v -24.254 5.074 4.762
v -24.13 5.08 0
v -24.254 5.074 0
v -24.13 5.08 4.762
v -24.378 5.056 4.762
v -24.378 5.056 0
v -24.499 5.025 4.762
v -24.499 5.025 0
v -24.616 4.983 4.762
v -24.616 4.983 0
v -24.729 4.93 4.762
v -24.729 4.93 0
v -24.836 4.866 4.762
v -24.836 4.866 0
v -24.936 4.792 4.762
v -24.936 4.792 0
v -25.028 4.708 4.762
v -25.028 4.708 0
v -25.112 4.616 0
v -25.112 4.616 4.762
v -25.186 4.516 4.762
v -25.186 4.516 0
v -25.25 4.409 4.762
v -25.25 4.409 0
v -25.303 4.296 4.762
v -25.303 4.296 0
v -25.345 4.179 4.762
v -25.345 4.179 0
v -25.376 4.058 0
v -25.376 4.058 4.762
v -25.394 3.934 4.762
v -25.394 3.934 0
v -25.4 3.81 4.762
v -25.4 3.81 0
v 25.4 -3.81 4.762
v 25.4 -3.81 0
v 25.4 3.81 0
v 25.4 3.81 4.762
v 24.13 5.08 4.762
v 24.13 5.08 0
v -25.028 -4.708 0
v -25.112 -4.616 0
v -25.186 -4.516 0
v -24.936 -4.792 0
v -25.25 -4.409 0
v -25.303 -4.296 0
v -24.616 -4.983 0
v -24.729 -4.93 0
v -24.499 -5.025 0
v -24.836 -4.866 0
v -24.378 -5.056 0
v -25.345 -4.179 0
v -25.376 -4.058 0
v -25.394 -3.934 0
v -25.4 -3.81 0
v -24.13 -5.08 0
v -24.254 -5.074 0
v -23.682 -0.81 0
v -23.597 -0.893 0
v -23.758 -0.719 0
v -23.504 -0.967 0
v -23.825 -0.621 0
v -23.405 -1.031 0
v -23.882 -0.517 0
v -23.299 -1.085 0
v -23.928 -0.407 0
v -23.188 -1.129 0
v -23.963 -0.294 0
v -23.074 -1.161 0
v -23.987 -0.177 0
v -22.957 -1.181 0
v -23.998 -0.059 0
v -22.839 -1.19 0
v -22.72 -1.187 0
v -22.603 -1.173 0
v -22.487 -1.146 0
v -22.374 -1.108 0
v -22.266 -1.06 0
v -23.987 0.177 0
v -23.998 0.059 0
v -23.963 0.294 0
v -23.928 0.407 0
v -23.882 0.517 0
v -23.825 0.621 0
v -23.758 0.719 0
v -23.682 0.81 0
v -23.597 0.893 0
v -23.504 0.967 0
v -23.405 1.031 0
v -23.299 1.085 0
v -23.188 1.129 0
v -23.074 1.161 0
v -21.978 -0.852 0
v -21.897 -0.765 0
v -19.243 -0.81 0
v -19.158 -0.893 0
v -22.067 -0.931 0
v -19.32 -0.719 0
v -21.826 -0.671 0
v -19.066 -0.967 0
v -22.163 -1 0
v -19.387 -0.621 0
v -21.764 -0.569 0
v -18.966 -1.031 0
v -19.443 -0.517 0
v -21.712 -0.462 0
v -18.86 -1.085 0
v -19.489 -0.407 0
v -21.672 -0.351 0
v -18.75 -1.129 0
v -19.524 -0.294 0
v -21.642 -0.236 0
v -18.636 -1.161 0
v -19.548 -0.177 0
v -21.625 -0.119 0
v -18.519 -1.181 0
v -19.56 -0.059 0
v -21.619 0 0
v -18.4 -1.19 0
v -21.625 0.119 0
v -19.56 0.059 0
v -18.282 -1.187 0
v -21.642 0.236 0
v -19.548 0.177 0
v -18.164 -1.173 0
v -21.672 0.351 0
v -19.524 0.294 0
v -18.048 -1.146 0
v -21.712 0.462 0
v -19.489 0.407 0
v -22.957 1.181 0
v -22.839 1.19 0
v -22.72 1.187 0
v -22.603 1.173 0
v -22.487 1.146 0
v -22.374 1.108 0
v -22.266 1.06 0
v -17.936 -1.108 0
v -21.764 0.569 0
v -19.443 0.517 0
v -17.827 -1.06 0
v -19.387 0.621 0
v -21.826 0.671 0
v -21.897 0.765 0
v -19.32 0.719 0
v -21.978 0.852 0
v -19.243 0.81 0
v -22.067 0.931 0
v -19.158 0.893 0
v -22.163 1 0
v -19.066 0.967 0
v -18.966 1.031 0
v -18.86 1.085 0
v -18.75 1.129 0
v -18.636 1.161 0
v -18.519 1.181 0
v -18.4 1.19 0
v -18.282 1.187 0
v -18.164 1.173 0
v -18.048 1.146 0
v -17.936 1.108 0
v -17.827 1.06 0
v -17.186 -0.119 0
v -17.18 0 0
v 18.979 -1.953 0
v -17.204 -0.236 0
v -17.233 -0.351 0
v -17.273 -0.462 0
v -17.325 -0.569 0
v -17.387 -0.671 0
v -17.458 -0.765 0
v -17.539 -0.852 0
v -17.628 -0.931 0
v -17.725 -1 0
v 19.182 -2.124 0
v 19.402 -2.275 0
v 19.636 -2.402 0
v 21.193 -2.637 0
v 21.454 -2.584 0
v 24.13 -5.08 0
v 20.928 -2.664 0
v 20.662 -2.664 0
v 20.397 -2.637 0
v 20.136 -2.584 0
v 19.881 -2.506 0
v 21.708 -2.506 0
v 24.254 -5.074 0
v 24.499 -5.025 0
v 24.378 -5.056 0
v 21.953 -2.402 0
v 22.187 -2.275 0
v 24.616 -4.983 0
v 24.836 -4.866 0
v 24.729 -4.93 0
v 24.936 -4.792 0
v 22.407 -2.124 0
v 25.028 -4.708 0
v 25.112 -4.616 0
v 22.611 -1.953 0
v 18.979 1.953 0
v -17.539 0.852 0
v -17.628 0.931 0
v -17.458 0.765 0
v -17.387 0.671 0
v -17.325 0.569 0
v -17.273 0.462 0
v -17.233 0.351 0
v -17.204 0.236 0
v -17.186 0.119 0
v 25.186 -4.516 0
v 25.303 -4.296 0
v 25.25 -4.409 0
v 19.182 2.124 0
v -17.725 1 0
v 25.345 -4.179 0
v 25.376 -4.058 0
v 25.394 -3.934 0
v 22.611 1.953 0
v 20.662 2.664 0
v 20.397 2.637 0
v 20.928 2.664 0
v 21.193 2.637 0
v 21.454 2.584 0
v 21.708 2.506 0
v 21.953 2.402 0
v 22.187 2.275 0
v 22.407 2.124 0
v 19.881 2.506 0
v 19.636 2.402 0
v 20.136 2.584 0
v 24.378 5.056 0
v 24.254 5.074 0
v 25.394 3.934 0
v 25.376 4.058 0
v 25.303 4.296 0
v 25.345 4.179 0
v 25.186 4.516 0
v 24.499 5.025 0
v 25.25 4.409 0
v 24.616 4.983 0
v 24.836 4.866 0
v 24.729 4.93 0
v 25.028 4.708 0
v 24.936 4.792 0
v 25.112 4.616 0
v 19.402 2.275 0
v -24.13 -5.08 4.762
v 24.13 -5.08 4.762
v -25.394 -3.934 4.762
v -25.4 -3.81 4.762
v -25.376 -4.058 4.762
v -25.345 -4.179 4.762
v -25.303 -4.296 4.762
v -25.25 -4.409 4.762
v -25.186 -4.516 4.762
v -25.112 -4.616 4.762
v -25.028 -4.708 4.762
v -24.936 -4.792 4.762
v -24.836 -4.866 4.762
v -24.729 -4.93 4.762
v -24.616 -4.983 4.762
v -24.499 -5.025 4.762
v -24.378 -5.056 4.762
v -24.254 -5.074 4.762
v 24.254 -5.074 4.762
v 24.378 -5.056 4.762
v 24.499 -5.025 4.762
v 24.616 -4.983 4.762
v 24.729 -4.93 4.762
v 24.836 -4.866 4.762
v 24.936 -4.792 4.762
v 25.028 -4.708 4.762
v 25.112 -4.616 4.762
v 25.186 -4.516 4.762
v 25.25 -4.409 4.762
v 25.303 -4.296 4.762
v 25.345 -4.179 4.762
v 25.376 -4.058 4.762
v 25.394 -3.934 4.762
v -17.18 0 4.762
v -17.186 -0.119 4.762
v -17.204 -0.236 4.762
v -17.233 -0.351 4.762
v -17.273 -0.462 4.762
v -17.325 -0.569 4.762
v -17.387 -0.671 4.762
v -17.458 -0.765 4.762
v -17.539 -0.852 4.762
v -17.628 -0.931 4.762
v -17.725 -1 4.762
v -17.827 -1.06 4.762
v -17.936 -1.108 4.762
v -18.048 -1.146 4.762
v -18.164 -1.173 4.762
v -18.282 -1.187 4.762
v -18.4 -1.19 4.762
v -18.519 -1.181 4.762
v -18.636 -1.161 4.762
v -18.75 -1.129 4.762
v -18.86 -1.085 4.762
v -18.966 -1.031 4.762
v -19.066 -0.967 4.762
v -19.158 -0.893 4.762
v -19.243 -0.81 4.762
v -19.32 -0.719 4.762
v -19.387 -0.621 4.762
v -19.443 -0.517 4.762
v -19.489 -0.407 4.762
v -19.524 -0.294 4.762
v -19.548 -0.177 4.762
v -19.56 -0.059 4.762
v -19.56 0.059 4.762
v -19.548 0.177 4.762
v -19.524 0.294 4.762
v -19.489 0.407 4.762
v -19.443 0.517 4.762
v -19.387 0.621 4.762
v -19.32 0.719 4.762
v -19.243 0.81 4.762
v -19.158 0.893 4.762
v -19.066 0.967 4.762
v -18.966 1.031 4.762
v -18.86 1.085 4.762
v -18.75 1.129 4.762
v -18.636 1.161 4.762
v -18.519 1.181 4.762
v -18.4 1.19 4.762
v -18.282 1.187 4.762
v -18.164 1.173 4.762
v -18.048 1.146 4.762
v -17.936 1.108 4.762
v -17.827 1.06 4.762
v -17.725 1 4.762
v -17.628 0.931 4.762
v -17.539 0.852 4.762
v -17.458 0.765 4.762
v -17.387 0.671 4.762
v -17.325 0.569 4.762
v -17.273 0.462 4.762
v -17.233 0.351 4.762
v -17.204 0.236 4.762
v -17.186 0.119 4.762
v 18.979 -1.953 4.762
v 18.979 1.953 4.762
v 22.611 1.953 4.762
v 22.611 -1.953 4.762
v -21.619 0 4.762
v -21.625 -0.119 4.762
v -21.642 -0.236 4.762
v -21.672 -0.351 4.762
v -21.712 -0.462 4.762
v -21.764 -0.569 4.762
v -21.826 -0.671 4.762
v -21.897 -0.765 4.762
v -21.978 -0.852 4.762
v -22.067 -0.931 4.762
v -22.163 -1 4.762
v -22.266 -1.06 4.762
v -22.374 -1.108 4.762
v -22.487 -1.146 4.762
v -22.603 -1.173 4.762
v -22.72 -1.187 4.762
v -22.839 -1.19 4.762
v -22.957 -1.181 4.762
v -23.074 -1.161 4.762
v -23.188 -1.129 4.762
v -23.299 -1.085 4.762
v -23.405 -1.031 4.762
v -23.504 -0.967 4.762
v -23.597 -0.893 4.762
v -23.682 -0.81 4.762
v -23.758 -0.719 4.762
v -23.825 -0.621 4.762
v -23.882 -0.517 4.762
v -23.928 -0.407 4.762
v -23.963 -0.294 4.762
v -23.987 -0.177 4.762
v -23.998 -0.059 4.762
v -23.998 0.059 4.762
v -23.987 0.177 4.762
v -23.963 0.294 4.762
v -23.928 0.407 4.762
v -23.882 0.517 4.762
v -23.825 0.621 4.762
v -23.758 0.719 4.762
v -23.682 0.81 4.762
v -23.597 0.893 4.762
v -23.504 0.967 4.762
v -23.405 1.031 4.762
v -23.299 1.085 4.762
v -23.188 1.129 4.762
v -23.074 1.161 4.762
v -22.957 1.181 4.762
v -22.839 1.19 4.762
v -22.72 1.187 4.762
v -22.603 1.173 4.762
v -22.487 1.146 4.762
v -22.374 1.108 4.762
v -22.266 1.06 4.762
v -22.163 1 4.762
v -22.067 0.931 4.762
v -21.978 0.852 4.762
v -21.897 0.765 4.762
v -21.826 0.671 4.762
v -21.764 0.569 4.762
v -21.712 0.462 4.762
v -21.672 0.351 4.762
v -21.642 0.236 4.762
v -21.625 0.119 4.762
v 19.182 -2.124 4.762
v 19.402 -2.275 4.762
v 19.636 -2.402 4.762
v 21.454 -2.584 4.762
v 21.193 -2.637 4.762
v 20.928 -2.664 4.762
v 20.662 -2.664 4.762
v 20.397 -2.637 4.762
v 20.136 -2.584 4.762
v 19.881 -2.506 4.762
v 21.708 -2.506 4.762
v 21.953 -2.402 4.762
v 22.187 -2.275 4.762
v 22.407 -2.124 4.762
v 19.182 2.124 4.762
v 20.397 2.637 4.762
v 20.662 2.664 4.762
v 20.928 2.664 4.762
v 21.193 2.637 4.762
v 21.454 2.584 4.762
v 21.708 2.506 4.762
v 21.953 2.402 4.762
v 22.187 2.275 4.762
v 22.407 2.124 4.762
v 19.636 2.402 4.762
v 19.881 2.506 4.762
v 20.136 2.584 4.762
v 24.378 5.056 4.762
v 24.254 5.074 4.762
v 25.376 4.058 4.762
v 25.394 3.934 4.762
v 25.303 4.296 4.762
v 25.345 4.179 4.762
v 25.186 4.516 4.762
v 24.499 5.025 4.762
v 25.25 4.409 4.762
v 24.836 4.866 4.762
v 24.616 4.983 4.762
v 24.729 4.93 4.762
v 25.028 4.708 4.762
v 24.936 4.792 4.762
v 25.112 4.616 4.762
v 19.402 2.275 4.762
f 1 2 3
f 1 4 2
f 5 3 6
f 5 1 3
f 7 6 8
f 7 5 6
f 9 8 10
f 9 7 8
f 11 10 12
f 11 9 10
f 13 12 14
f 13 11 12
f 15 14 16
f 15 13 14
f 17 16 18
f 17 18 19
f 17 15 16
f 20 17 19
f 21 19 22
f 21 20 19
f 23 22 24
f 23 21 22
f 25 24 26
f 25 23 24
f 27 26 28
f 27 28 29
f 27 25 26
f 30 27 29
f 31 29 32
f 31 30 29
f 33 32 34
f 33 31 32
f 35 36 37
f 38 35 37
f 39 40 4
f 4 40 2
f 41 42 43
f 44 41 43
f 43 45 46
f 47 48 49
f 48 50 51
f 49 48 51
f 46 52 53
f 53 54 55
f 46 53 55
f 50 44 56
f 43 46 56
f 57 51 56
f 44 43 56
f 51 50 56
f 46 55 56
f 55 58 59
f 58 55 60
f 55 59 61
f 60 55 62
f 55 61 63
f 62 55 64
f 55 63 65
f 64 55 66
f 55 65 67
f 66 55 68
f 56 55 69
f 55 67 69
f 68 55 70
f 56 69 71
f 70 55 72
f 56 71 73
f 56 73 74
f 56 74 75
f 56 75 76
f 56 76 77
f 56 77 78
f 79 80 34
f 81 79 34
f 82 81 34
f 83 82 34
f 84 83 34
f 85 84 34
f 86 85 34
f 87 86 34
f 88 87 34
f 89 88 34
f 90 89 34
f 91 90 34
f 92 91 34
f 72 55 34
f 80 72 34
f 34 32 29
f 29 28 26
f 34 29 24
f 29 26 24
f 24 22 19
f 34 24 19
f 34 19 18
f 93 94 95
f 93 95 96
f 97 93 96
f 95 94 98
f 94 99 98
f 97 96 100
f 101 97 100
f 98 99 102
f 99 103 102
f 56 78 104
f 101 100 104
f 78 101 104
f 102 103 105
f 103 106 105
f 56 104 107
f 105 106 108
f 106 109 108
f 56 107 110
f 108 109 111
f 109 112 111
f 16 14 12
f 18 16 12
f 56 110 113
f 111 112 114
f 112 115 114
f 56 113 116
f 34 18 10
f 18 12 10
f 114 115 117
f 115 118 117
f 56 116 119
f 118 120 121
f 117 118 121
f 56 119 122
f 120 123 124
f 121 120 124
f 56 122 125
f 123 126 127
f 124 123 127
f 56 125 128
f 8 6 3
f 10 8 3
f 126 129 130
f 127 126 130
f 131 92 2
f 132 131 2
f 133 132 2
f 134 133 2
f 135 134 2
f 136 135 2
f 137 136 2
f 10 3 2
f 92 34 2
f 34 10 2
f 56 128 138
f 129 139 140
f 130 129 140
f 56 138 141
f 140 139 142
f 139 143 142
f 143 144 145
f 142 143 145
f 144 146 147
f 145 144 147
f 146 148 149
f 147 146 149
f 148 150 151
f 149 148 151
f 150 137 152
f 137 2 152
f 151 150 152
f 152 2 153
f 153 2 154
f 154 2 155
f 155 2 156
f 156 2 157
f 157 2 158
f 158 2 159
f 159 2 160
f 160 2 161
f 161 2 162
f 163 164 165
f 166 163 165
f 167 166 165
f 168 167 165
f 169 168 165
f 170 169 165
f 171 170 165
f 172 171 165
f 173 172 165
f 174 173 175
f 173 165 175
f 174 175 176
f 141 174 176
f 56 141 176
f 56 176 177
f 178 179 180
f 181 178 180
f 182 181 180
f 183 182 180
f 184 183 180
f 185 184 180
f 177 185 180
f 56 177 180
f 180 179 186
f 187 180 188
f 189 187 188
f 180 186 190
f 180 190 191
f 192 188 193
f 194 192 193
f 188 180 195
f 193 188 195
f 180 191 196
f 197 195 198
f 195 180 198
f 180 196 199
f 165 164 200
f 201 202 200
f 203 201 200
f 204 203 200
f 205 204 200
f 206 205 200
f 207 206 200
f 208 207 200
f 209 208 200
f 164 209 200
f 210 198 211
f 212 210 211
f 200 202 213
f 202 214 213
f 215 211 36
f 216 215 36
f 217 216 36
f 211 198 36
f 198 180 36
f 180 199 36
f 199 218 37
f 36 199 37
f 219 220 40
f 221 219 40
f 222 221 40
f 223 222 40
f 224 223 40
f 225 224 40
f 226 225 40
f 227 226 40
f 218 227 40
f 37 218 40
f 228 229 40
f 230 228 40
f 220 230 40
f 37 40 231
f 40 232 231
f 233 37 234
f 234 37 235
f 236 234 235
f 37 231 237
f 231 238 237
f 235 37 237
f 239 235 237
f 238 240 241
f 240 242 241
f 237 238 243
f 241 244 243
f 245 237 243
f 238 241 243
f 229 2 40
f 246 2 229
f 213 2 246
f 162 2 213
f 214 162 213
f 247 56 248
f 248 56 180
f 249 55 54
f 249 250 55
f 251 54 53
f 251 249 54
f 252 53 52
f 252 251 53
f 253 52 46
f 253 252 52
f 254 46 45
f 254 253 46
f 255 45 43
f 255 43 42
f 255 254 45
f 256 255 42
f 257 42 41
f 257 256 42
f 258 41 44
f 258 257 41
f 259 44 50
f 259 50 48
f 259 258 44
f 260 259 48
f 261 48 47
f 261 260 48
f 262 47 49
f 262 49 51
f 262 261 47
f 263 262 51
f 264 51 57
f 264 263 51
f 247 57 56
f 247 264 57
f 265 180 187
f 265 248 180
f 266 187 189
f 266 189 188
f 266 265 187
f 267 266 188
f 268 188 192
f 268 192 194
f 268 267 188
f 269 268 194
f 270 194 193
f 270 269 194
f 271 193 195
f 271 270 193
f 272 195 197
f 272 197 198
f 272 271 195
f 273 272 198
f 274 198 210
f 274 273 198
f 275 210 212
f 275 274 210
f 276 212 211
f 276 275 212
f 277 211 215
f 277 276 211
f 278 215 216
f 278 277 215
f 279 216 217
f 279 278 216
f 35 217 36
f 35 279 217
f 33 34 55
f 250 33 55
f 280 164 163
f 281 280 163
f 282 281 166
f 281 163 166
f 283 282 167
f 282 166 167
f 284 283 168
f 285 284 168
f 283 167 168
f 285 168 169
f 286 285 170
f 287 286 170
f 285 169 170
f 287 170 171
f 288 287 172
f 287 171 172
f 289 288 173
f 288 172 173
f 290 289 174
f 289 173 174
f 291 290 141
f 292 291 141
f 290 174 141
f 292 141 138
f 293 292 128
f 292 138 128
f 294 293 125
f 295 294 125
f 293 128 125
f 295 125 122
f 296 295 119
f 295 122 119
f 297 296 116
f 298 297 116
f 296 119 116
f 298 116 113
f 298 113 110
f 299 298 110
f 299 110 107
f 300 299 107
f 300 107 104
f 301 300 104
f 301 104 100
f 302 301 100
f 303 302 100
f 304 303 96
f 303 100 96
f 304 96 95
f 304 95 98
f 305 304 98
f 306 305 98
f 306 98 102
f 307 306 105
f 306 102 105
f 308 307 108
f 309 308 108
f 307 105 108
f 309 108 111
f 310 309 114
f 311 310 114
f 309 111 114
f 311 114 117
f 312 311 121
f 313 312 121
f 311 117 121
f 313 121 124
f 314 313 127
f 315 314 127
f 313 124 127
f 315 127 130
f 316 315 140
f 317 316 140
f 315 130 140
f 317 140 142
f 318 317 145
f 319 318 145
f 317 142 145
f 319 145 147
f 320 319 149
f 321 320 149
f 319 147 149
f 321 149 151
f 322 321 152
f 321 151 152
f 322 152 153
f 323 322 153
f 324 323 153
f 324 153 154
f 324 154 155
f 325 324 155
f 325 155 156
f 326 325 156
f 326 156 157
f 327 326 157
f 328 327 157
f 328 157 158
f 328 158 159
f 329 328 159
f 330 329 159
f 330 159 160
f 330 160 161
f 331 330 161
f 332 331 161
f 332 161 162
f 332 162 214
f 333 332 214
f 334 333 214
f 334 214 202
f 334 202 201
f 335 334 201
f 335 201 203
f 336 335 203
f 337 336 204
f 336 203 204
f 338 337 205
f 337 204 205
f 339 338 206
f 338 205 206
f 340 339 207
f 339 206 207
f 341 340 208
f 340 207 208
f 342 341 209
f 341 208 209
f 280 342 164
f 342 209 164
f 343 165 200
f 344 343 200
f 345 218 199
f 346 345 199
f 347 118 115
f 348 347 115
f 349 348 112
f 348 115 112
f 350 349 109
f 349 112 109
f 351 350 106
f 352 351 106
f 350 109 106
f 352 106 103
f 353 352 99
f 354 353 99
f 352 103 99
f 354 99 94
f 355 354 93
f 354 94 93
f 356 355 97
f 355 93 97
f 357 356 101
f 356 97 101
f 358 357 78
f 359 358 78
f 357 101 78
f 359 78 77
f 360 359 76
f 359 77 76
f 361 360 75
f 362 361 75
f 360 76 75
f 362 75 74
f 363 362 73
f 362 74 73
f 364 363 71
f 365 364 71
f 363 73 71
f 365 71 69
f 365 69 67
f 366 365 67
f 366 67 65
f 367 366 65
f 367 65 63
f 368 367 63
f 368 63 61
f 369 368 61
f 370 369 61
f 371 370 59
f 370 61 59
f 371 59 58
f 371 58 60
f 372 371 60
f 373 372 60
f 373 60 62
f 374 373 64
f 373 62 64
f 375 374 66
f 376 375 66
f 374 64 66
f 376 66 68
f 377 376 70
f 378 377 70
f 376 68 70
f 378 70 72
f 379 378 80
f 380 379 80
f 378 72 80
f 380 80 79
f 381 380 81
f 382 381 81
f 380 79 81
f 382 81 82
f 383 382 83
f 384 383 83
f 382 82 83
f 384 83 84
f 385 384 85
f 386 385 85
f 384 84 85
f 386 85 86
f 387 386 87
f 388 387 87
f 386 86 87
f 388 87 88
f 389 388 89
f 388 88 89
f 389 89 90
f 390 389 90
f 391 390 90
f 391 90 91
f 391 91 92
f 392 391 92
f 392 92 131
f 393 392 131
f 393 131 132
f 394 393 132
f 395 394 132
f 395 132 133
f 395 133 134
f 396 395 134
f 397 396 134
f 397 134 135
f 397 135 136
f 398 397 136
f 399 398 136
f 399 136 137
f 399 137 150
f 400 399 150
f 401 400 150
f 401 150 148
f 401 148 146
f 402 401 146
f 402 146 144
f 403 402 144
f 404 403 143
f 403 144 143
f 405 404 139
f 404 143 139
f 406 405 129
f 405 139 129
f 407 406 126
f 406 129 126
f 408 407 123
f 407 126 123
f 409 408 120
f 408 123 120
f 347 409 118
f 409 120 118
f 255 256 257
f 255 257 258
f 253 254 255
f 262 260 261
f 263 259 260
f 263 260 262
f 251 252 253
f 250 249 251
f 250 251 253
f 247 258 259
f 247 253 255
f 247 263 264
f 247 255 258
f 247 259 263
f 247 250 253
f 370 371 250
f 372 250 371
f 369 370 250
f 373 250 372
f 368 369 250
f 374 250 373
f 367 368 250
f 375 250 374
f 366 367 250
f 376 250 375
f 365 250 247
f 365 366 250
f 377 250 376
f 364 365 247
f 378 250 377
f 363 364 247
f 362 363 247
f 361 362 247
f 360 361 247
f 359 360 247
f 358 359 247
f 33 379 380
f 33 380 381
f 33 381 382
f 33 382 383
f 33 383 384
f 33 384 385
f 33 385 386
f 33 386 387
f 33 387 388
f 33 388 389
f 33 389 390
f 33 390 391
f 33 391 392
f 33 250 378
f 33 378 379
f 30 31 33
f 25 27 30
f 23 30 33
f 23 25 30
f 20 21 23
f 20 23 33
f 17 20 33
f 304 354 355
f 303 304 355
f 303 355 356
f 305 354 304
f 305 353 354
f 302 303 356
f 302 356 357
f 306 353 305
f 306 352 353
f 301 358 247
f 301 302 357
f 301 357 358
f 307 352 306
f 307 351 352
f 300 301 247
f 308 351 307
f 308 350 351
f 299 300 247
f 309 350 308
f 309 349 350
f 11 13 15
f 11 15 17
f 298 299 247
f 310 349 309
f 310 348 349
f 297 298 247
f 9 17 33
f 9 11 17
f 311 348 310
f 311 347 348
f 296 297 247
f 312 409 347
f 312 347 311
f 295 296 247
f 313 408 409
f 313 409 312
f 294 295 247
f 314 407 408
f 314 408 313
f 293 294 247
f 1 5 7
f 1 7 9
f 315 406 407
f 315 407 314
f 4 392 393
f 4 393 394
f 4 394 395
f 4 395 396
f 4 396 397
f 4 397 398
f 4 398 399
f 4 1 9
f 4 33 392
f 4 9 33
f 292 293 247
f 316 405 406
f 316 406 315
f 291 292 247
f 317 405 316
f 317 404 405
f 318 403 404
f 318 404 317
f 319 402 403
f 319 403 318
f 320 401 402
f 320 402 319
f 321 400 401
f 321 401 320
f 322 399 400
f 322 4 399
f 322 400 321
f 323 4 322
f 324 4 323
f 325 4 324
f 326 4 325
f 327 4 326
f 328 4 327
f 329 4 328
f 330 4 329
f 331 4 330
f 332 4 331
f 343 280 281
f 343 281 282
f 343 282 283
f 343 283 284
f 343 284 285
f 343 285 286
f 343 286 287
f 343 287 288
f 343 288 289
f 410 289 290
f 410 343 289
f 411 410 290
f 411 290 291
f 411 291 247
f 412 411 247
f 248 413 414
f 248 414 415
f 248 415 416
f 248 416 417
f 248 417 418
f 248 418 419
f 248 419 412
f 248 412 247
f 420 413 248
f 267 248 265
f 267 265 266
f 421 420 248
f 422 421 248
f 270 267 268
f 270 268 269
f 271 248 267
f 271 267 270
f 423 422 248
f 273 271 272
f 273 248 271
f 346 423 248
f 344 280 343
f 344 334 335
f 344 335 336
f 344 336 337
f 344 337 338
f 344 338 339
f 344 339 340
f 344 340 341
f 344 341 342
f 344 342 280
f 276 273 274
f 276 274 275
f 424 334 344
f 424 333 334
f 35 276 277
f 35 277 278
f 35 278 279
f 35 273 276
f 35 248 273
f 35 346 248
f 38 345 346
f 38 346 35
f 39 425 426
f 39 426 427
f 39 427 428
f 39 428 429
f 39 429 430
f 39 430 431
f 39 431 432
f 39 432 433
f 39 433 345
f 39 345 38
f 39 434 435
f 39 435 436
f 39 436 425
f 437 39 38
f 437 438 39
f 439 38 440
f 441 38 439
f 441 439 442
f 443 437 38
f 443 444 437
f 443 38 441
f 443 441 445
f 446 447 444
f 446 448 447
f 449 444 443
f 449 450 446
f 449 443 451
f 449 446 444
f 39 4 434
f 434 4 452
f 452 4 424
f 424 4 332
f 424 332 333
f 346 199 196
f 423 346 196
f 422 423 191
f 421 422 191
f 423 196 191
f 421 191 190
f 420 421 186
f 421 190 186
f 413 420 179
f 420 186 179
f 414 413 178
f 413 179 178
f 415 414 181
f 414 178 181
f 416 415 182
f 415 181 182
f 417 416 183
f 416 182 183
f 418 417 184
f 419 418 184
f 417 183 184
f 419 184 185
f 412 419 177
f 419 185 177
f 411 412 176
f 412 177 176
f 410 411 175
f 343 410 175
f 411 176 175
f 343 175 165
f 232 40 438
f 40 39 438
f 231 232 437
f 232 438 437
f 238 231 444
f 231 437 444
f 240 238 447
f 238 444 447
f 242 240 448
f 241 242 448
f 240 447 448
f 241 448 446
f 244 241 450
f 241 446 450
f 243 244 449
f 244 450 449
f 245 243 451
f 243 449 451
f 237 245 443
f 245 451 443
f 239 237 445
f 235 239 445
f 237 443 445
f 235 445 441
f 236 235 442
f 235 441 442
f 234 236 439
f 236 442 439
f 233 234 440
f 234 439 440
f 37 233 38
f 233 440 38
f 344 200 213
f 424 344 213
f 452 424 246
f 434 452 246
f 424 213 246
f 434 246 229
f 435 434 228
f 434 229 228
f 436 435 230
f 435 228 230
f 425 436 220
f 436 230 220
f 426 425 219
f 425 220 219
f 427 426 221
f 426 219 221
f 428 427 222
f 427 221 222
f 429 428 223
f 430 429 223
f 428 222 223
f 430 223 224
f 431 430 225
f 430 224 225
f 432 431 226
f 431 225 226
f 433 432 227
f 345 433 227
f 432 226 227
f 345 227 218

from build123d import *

# Parameters (mm, degrees)
F1_DEPTH = 4.7625
F2_R     = 1.27


# Not quite as in the source:
# - a length typed as a fraction of an inch, garbled in the dataset ("3 / 203.2 mm" for 3/8 in), is restored


with BuildPart() as f1:
    # F0 (on Top) → F1 (new body)
    with BuildSketch(Plane.XY):
        with BuildLine():
            Line((25.4, 0), (25.4, 5.08))
            Line((25.4, 5.08), (-25.4, 5.08))
            Line((-25.4, 5.08), (-25.4, 0))
            Line((-25.4, 0), (-23.9999255717, 0))
            ThreePointArc((-23.9999255717, 0), (-22.8093005717, 1.190625), (-21.6186755717, 0))
            Line((-21.6186755717, 0), (-19.5611937523, 0))
            ThreePointArc((-19.5611937523, 0), (-18.3705687523, 1.190625), (-17.1799437523, 0))
            Line((-17.1799437523, 0), (18.1277101444, 0))
            ThreePointArc((18.1277101444, 0), (18.3496715251, 1.0652113171), (18.9786101444, 1.9531179662))
            ThreePointArc((18.9786101444, 1.9531179662), (20.7947101444, 2.667), (22.6108101444, 1.9531179662))
            ThreePointArc((22.6108101444, 1.9531179662), (23.2397487637, 1.0652113171), (23.4617101444, 0))
            Line((23.4617101444, 0), (25.4, 0))
        make_face()
        with BuildLine():
            Line((18.1277101444, 0), (18.9786101444, 0))
            Line((18.9786101444, 0), (18.9786101444, 1.9531179662))
            ThreePointArc((18.9786101444, 1.9531179662), (18.3496715251, 1.0652113171), (18.1277101444, 0))
        make_face()
        with BuildLine():
            Line((18.9786101444, -1.9531179662), (18.9786101444, 0))
            Line((18.9786101444, 0), (18.1277101444, 0))
            ThreePointArc((18.1277101444, 0), (18.3496715251, -1.0652113171), (18.9786101444, -1.9531179662))
        make_face()
        with BuildLine():
            Line((22.6108101444, 0), (23.4617101444, 0))
            ThreePointArc((23.4617101444, 0), (23.2397487637, 1.0652113171), (22.6108101444, 1.9531179662))
            Line((22.6108101444, 1.9531179662), (22.6108101444, 0))
        make_face()
        with BuildLine():
            ThreePointArc((22.6108101444, -1.9531179662), (23.2397487637, -1.0652113171), (23.4617101444, 0))
            Line((23.4617101444, 0), (22.6108101444, 0))
            Line((22.6108101444, 0), (22.6108101444, -1.9531179662))
        make_face()
        with BuildLine():
            Line((25.4, -5.08), (25.4, 0))
            Line((25.4, 0), (23.4617101444, 0))
            ThreePointArc((23.4617101444, 0), (23.2397487637, -1.0652113171), (22.6108101444, -1.9531179662))
            ThreePointArc((22.6108101444, -1.9531179662), (20.7947101444, -2.667), (18.9786101444, -1.9531179662))
            ThreePointArc((18.9786101444, -1.9531179662), (18.3496715251, -1.0652113171), (18.1277101444, 0))
            Line((18.1277101444, 0), (-17.1799437523, 0))
            ThreePointArc((-17.1799437523, 0), (-18.3705687523, -1.190625), (-19.5611937523, 0))
            Line((-19.5611937523, 0), (-21.6186755717, 0))
            ThreePointArc((-21.6186755717, 0), (-22.8093005717, -1.190625), (-23.9999255717, 0))
            Line((-23.9999255717, 0), (-25.4, 0))
            Line((-25.4, 0), (-25.4, -5.08))
            Line((-25.4, -5.08), (25.4, -5.08))
        make_face()
    extrude(amount=F1_DEPTH)

    # F2
    f2_edges = [f1.edges().sort_by_distance(p)[0] for p in [
        (25.4, 5.08, 2.38125),
        (25.4, -5.08, 2.38125),
        (-25.4, 5.08, 2.38125),
        (-25.4, -5.08, 2.38125),
    ]]
    fillet(f2_edges, radius=F2_R)


solid = f1.part
